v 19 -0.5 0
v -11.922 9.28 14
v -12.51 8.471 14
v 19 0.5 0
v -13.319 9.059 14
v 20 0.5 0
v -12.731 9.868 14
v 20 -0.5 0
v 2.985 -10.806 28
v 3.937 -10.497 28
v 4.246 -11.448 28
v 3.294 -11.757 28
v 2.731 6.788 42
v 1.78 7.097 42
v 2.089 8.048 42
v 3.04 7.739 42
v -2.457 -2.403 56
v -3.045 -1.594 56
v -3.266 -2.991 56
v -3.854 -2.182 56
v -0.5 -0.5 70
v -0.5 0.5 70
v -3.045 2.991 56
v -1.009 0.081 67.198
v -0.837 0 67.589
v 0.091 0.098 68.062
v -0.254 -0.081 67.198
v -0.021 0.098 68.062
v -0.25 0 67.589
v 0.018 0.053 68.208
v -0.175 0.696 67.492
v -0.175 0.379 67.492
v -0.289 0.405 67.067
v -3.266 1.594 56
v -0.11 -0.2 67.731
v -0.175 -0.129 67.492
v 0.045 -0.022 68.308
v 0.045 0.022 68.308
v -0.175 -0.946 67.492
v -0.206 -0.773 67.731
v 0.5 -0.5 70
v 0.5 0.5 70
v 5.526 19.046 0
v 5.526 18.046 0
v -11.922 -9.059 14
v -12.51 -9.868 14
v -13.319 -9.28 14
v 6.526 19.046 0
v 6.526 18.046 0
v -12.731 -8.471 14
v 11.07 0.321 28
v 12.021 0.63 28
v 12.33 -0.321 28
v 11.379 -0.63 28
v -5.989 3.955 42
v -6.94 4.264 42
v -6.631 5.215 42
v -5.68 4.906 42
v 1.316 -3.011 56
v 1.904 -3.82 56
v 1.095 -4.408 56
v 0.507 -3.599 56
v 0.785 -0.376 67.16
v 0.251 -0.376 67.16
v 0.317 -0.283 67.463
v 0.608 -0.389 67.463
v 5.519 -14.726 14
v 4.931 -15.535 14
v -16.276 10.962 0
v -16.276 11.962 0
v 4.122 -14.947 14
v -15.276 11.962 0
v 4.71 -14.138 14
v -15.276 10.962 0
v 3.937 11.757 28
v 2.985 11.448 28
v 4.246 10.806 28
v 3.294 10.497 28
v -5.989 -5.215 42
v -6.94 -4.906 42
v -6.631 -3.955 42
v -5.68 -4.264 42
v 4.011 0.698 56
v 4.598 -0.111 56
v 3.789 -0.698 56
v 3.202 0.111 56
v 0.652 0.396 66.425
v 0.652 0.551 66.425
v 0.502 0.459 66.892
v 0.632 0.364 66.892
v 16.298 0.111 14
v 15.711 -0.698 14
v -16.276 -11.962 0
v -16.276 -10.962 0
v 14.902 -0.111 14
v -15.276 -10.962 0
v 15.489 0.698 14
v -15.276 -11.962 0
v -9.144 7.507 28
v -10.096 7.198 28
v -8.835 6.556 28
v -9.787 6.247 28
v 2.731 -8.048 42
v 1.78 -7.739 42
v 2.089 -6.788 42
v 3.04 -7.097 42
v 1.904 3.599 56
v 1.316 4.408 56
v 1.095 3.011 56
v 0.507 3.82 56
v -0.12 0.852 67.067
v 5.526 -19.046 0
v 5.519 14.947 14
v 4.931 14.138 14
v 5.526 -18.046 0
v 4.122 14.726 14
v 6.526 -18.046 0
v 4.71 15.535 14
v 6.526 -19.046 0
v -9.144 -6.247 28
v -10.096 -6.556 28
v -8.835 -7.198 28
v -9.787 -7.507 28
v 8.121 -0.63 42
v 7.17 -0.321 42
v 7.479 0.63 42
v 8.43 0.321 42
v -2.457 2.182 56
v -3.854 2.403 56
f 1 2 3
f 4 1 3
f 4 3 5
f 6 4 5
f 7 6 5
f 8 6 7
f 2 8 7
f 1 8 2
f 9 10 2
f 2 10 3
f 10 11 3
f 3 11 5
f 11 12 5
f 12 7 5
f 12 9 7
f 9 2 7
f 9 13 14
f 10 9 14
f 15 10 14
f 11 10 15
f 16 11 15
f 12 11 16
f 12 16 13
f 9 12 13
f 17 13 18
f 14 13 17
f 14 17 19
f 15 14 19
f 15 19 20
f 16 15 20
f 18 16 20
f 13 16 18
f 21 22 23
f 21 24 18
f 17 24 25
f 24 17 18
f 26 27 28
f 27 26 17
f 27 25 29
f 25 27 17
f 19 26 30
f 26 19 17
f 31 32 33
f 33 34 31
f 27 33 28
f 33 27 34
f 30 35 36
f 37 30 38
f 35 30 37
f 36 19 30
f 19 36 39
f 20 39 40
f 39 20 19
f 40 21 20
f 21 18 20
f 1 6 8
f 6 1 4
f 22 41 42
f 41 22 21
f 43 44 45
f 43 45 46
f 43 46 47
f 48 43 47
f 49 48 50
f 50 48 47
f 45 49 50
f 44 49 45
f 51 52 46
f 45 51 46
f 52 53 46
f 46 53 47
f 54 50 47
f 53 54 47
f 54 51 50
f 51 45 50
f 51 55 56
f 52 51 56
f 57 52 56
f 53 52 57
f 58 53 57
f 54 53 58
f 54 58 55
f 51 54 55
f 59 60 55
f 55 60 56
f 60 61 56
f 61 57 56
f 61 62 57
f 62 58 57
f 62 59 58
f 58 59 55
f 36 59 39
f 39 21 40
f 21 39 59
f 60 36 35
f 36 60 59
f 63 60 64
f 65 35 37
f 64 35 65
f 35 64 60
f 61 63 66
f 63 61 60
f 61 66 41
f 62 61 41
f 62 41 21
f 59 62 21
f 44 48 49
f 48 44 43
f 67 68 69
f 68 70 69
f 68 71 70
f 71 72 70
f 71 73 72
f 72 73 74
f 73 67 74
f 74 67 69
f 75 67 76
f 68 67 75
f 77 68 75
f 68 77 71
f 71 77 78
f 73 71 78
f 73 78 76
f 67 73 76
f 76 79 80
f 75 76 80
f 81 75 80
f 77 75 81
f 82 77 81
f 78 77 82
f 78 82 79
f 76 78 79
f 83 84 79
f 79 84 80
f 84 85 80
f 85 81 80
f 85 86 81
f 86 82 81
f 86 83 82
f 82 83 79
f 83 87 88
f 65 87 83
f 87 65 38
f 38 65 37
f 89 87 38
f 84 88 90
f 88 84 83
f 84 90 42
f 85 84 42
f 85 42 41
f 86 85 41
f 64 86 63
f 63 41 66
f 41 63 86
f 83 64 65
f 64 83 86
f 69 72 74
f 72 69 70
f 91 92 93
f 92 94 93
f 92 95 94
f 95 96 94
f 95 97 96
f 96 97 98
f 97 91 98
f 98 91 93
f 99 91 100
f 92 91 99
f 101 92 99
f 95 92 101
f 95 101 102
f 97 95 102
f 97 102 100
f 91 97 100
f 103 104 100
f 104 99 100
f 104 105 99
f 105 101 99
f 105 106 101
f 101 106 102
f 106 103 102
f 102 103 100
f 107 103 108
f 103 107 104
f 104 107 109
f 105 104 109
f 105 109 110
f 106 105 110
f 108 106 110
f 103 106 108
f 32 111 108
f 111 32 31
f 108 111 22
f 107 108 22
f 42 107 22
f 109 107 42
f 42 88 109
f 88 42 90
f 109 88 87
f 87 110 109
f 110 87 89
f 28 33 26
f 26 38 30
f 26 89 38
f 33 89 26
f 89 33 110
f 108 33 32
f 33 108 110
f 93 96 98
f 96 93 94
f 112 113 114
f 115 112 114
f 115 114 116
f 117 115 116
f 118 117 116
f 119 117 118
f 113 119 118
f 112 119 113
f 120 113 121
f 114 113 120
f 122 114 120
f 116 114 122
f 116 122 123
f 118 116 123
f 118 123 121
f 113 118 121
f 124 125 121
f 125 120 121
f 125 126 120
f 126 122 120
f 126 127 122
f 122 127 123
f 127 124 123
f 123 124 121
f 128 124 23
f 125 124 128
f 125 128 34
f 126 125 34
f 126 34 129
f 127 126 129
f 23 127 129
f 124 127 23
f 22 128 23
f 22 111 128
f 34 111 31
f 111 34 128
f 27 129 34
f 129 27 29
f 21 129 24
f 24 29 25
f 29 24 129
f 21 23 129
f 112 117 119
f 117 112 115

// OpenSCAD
// file: ../lib/helpers.math.scad
// Constants

e = 2.71828;
inf = 1e-5;

// Logistic function and its derivative.

function logistic_function(x) = 
  let (ex = exp(x))
  ex / (ex + 1);

function logistic_function_dx(x) = 
  let (ex = exp(x))
  ex / ((ex + 1)*(ex + 1));
  
// Calculates length of a vector.

function length(v) = norm(v);

// Normalizes a vector.

function normalize(v) = v / length(v);

// Angle between two vectors.

function angle(u, v) = atan2(norm(cross(u, v)), u*v);
// file: ../lib/helpers.lists.scad
// Creates a list of integers.

function range(r) = [for (x = r) x];

// Reverses a list.
    
function reverse(list) = [for (i = [len(list)-1:-1:0]) list[i]];
  
// Concatenates two lists. If either of them is `undef`, it is ignored.

function concat_undef(list1, list2) =
    concat(is_undef(list1) ? [] : list1, is_undef(list2) ? [] : list2);

// Quicksort
// http://forum.openscad.org/OpenJSCAD-our-javascript-friends-td7835.html

function quicksort(list) = !(len(list)>0) ? [] : let( 
    pivot   = list[floor(len(list)/2)], 
    lesser  = [ for (y = list) if (y  < pivot) y ], 
    equal   = [ for (y = list) if (y == pivot) y ], 
    greater = [ for (y = list) if (y  > pivot) y ] 
) concat( 
    quicksort(lesser), equal, quicksort(greater) 
); 

// Returns sum of list elements.

function sum_list(list, idx = 0) =
  len(list) == 0 ? 0
                 :  idx < len(list) - 1 ? list[idx] + sum_list(list, idx + 1)
                                        : list[idx];

// Checks whether a list is a vector (must contain elements, first element must be a number).

function is_vector(v) = 
  is_list(v) 
  && len(v) > 0 
  && is_num(v[0]);
// file: ../lib/mesh.solids.scad
use <geometry.scad>
use <geometry.manipulators.scad>
use <curves.scad>
use <mesh.scad>

// Makes a polyhedron out of a mesh.

module mesh_polyhedron(mesh, closed = false) {
  polyhedron(mesh, make_band_faces(mesh, closed));
}   
   
// mesh_polyhedron(make_polygon_mesh(20, 7, 5, 3));

// renders a band sinusoidally oscillating along y and z axes

module sinus_spiral(length, yheight, zheight, ythick, zthick, num_waves, offset = 0) {
  wsin = make_band_points(
           wave_points(length, yheight, zheight, num_waves, offset, offset + 90),
           ythick, zthick);
  mesh_polyhedron(wsin);  
}    

// tester for sinus_spiral()

module test_sinus_spiral(length, yheight, zheight, ythick, zthick, num_waves, offset = 0) {
  color("red")
  sinus_spiral(length, yheight, zheight, ythick, zthick, num_waves, offset);
  
  color("green")
  sinus_spiral(length, yheight, zheight, ythick, zthick, num_waves, offset + 180);
}

//test_sinus_spiral(80, 10, 5, 5, 5, 2, $fn=50);

// renders a band based on segment_line()

module slab(length, dy, dz) {
  mesh_polyhedron(make_band_points(segment_line([0, 0, 0], [length, 0, 0]), dy, dz));
}

// Draws a very thin curve in Preview only.

module visualize_curve (curve, width = 0.1) {
  if ($preview) {
    w2 = width/2;
    mesh = concat(     
             translate(curve, [-w2, -w2, -w2]),
             translate(curve, [-w2,  w2,  w2]),
             translate(curve, [ w2, -w2,  w2]),
             translate(curve, [ w2,  w2, -w2]));
    color("red", alpha=0.2)
    mesh_polyhedron(mesh); 
  }
}
// file: ../lib/mesh.scad
include <helpers.math.scad>
use <geometry.scad>
use <geometry.manipulators.scad>
use <curves.scad>

// Generates a regular polygon, offset in y and z direction.

function make_polyhedron_mesh(radius, numSides, ywidth, zwidth) =
  let (p1o = make_unit_polygon(numSides) * radius,
       p1 = concat(p1o, [p1o[0]]),
       p2 = scale(p1, (radius - ywidth) / radius))
  concat(p2,
         p1,
         translate(p2, [0, 0, zwidth]),
         translate(p1, [0, 0, zwidth]));

// Linear shear perpendicular to Z axis. `begin1/end1` segment is sheared to `begin2/end2` segment.
  
function zshear_mesh(mesh, begin1, end1, begin2, end2) = 
  let (dz1 = end1.z - begin1.z,
       dz2 = end2.z - begin2.z)
  [for (pt = mesh)
    let (k = (pt.z - begin1.z) / dz1,
         pt1 = interpolate(k, begin1, end1),
         pt2 = interpolate(k, begin2, end2))
    [pt2.x + (pt.x - pt1.x), pt2.y + (pt.y - pt1.y), pt.z]
  ];

// Twist mesh along a curve.

function twist_mesh(mesh, curve, angle) =
  let (full_len = curve_len(curve))
  [for (pt = mesh) 
    let (find = curve_find_closest_point(curve, pt),
         pt_len = curve_partial_len(curve, find[1], find[0]))
    rotate(pt, angle * pt_len/full_len, find[0], curve[find[1]+1] - curve[find[1]])
  ];

// Reflows mesh extending along source_path into new mesh extending along target_path.

function reflow_mesh(mesh, source_path, target_path) = 
  let (source_len = curve_len(source_path),
       target_len = curve_len(target_path))
  [for (pt = mesh) 
    let (nearest_s = curve_find_closest_point(source_path, pt),
         nearest_len = curve_partial_len(source_path, nearest_s[1], nearest_s[0]),
         nearest_t = curve_find_offset(target_path, nearest_len/source_len),
         u = source_path[nearest_s[1]+1] - source_path[nearest_s[1]],
         v = target_path[nearest_t[1]+1] - target_path[nearest_t[1]],
         pt_t = rotate(pt, angle(u, v), nearest_s[0], cross(v , u)))
    pt_t +  nearest_t[0] - nearest_s[0]];

// Makes four copies of a list of points, offset in y, z, and y+z directions.
// Output can be plugged into polyhedron().    

function make_band_points(curve, dy, dz) = 
  concat(     curve, 
    translate(curve, [0, dy, 0]),
    translate(curve, [0, 0, dz]),
    translate(curve, [0, dy, dz]));
  
// Takes an output from make_band_points() and generates list of faces.
// Output can be plugged into polyhedron().
  
function make_band_faces(mesh, closed = false) =
  let (num = len(mesh) / 4)
  let (b1l = 0 * num)
  let (b2l = 1 * num)
  let (b1u = 2 * num)
  let (b2u = 3 * num)
  let (last = closed ? num - 2 : num - 1)
  concat(
    [for (i = [0 : last - 1])
       each([
         [i + b1l, i + b1u, i + 1 + b1u, i + 1 + b1l],      
         [i + b1u, i + b2u, i + 1 + b2u, i + 1 + b1u],
         [i + b2u, i + b2l, i + 1 + b2l, i + 1 + b2u],
         [i + b2l, i + b1l, i + 1 + b1l, i + 1 + b2l]
       ])],
    closed ? [ [last + b1l, last + b1u, 0 + b1u, 0 + b1l],      
               [last + b1u, last + b2u, 0 + b2u, 0 + b1u],
               [last + b2u, last + b2l, 0 + b2l, 0 + b2u],
               [last + b2l, last + b1l, 0 + b1l, 0 + b2l] ] 
           : [ [b1l, b2l, b2u, b1u],
               [num - 1 + b1l, num - 1 + b1u, num - 1 + b2u, num - 1 + b2l] ]
  );
// file: ../lib/curves.scad
include <helpers.math.scad>
use <helpers.lists.scad> 
use <geometry.scad>

// Multi-segment straight line between two 3D points.

function make_segment_line(from, to) =
  let (segments = $fn > 0 ? $fn : 50)
  let (d = [(to.x - from.x)/segments, (to.y - from.y)/segments, (to.z - from.z)/segments])
  [for (i = [0:segments]) [from.x + i * d.x, from.y + i * d.y, from.z + i * d.z]];
    
// Reqular polygon inscribed in a unit circle with one vertex at (1,0).
  
function make_unit_polygon(numsides) =
  [for (i = [0:numsides - 1]) point_on_unit_circle(360/numsides*i)];
  
// 3D sinusoidal wave, starting at [0,0], extending along x.

function make_wave(width, yheight, zheight, num_waves, yoffset = 0,zoffset = 0) = 
  let (segments = $fn > 0 ? $fn : 50)
  let (delta = width / segments)
  [for (i = [0:segments]) 
    [i*width/segments, 
     sin((i/segments) * 360 * num_waves - yoffset) * yheight, 
     sin((i/segments) * 360 * num_waves - zoffset) * zheight]];

// Logistic curve, scaled along x and y axes, translated on y axis to pass through (0,0).
  
function make_logistic_curve(x1, x2, xscale, yscale) = 
  let (segments = $fn > 0 ? $fn : 50)
  [for (i = [0:segments])
    let (x = x1 + (x2 - x1) / segments * i) 
    [x, yscale * (logistic_function(x / xscale) - 1/2)]];

// Offsets a curve and concats it to the original. Output can be plugged into a polygon().

function make_strip_points(curve, offset) = 
  concat(curve, reverse(translate(curve, offset)));

// Finds a closest point on a curve and returns point-on-curve and the segment index (starting from 0).

function _curve_fcp(curve, pt, idx, best) = // [pt_on_curve, segment_index, distance]
  let (pt1 = find_closest_point(curve[idx], curve[idx+1], pt),
       d1 =  distance(pt1, pt),
       b1 = is_undef(best) 
         ? [pt1, idx, d1]
         : d1 < best[2] 
           ? [pt1, idx, d1] 
           : best)
  idx == 0 ? b1 : _curve_fcp(curve, pt, idx - 1, b1);

function curve_find_closest_point(curve, pt) = // [pt_on_curve, segment_index, distance]
  assert(len(curve) > 1, "Curve must have at least one segment")
  let (tmp = _curve_fcp(curve, pt, len(curve) - 2, undef))
  tmp;

// curve = [[1,1], [2,3], [3, 5]];
// echo(curve_find_closest_point(curve, [2,2]));
// echo(curve_find_closest_point(curve, [2,3]));

// Returns length of a curve.

function curve_len(curve) = 
  sum_list([for (i = [0:1:len(curve)-2]) distance(curve[i], curve[i+1])]);

// Returns partial length from start of the curve to segment/point.

function curve_partial_len(curve, segment, pt) =
  sum_list([for (i = [0:1:segment-1]) distance(curve[i], curve[i+1])])
  + distance(pt, curve[segment]);
  
//echo(curve_partial_len([[0,0], [1,1], [2,2]], 1, [1.5, 1.5]));

// Finds [point, segment index] on curve for t = [0..1].

function _curve_fo(curve, offset, idx) =
  let (seg_len = length(curve[idx + 1] - curve[idx]))
  seg_len >= offset 
    ? [interpolate(offset/seg_len, curve[idx], curve[idx+1]), idx]
    : idx == len(curve) - 2
      ? [curve[len(curve)-1], idx]
      : _curve_fo(curve, offset - seg_len, idx + 1);

function curve_find_offset(curve, t) = // [pt_on_curve, segment_index]
  assert(len(curve) > 1, "Curve must have at least one segment")
  assert(t >= 0 && t <= 1, "T must lie between 0 and 1")
  _curve_fo(curve, t * curve_len(curve), 0);
  
// echo(curve_find_offset([[0,0], [1,1], [2,2], [3,3]], 0));
// echo(curve_find_offset([[0,0], [1,1], [2,2], [3,3]], 0.5));
// echo(curve_find_offset([[0,0], [1,1], [2,2], [3,3]], 1));
// file: ../lib/geometry.manipulators.scad
/* Functions for manipulating points (2D/3D) and lists of points.
*/

use <helpers.math.scad>
use <helpers.lists.scad>
use <geometry.scad>

// Translates 2D/3D point or points by a specified offset.
// Offsetting a 2D point in 3 dimensions creates a 3D point.
// Offsetting a 3D point in 2 dimensions creates a 2D point.

function translate(points, offset) = 
  is_vector(points)
  ? let (pt = points)
    is_undef(offset.z) ? [pt.x + offset.x, pt.y + offset.y] 
                       : [pt.x + offset.x, pt.y + offset.y, make_3D(pt).z + offset.z]
  : [for (pt = points) translate(pt, offset)];
  
// echo(translate([[1,1], [1,1,1]], [1,1]));    // [2,2], [2,2]
// echo(translate([[1,1], [1,1,1]], [1,1,1]));  // [2,2,1], [2,2,2]
  
// Scales all points relatively to an optional `origin` (default = [0,0,0]). Supports 2D and 3D points.
  
function scale(points, factor, origin) = 
  [for (i = points) 
     is_undef(origin) 
       ? i * factor
       : (i - origin) * factor + origin];

// Mirrors x => -x. Supports 2D and 3D points.

function mirror_X(points) = 
  [for (pt = points) 
     is_undef(pt.z) ? [-pt.x, pt.y] : [-pt.x, pt.y, pt.z]];

// Mirrors y => -y. Supports 2D and 3D points.

function mirror_Y(points) = 
  [for (pt = points) 
     is_undef(pt.z) ? [pt.x, -pt.y] : [pt.x, -pt.y, pt.z]];

// Mirrors z => -z. Supports 3D points.

function mirror_Z(points) = 
  [for (pt = points) [pt.x, pt.y, -pt.z]];

// Rotates 2D/3D point or points around `origin` by `alpha` degrees along rotation axis `v`.

function rotate(points, angle, origin = [0, 0, 0], v = [0, 0, 1]) = 
  is_vector(points)
  ? let (pt = points,
         u = normalize(v),
         m = translate([pt], -1 * origin),
         c = cos(angle),
         s = sin(angle),
         R = [[c + u.x * u.x * (1 - c),         u.x * u.y * (1 - c) - u.z * s,  u.x * u.z * (1 - c) + u.y * s],
              [u.y * u.x * (1 - c) + u.z * s,   c + u.y * u.y * (1 - c),        u.y * u.z * (1 - c) + u.x * s],
              [u.z * u.x * (1 - c) + u.y * s,   u.z * u.y * (1 - c) + u.x * s,  c + u.z * u.z * (1 - c)]])
    translate([R * m[0]], origin)[0]
  : [for (pt = points) rotate(pt, angle, origin, v)];  

// echo(rotate([1, 1, 1], 90)); // [-1, 1, 1]
// echo(rotate([1, 1, 1], 90, [1, 0, 0], [0, 0, 1])); // [0, 0, 1]

// Wraps 2D/3D point or points around the cylinder with radius r and axis [0, y, -r]. 

function wrap_around_cylinder(points, r) = 
  is_vector(points)
  ? let (pt = make_3D(points),
         alpha = 360 / (2 * PI * r) * pt.x)
    [(r + pt.z) * sin(alpha), pt.y, -r + (r+pt.z) * cos(alpha)]
  : [for (pt = points) wrap_around_cylinder(pt, r)];
// file: ../lib/geometry.scad
/* Functions that implement calculations on points (2D/3D) and lists of points.
*/

use <helpers.lists.scad>
use <helpers.math.scad>

// Calculates distance between two points.

function distance(pt1, pt2) =
  length(pt2 - pt1);
  
// Linear interpolation between two points.

function interpolate(t, pt1, pt2) = 
  (1 - t) * pt1 + t * pt2;

// Sets Z coordinate to 0 if it is not defined.

function make_3D(pt) = 
  is_undef(pt.z) ? concat(pt, 0) : pt;
  
// Point on the unit circle on XY plane corresponding to `angle` (in degrees).
  
function point_on_unit_circle(angle) = [cos(angle), sin(angle)];

// Finds closest point on a segment.

function find_closest_point(from, to, pt) = 
  let(v = make_3D(to) - make_3D(from),
      u = make_3D(from) - make_3D(pt),
      vu = v*u,
      vv = v*v,
      t = -vu/vv)
  t >= 0 && t <= 1 
    ? interpolate(t, from, to)
    : let (dF = distance(pt, from),
           dT = distance(pt, to))
      dF < dT ? from : to;
// main file
use <../lib/geometry.scad>
use <../lib/geometry.manipulators.scad>
use <../lib/curves.scad>
use <../lib/mesh.scad>
use <../lib/mesh.solids.scad>

height = 70;
radius = 20;
step = 7;
ring_height = height - 2*step;
numsides = 5;
xwidth = 1;
ywidth = 1;
zwidth = 1;
twist = 720;

$fn = 5;

module rings (twist) {
  for (i = [0:step:ring_height]) {
    mesh_polyhedron(
      rotate(
        translate(
          make_polyhedron_mesh(radius * (height - i)/height, numsides, ywidth, zwidth),
          [0, 0, i]),
      twist * i/height)
    );
  }
}

module tent (twist) {
  b = translate(make_segment_line([0,0,0], [0,0,height]), [-xwidth/2, -ywidth/2, 0]);
  b1 = concat(b, 
                translate(b, [xwidth, 0, 0]),
                translate(b, [0, ywidth, 0]),
                translate(b, [xwidth, ywidth, 0]));
  for (pt = [0:1:numsides-1]) {
    v = point_on_unit_circle(360/numsides*pt) * (radius - xwidth/2);
    c = zshear_mesh(b1, [0, 0, height], [0, 0, 0], [0, 0, height], [v.x, v.y, 0]);
    mesh_polyhedron(twist_mesh(c, [[0,0,0], [0,0,height]], twist));
  }
}

//rings(twist);
tent(twist);
tent(-twist);
